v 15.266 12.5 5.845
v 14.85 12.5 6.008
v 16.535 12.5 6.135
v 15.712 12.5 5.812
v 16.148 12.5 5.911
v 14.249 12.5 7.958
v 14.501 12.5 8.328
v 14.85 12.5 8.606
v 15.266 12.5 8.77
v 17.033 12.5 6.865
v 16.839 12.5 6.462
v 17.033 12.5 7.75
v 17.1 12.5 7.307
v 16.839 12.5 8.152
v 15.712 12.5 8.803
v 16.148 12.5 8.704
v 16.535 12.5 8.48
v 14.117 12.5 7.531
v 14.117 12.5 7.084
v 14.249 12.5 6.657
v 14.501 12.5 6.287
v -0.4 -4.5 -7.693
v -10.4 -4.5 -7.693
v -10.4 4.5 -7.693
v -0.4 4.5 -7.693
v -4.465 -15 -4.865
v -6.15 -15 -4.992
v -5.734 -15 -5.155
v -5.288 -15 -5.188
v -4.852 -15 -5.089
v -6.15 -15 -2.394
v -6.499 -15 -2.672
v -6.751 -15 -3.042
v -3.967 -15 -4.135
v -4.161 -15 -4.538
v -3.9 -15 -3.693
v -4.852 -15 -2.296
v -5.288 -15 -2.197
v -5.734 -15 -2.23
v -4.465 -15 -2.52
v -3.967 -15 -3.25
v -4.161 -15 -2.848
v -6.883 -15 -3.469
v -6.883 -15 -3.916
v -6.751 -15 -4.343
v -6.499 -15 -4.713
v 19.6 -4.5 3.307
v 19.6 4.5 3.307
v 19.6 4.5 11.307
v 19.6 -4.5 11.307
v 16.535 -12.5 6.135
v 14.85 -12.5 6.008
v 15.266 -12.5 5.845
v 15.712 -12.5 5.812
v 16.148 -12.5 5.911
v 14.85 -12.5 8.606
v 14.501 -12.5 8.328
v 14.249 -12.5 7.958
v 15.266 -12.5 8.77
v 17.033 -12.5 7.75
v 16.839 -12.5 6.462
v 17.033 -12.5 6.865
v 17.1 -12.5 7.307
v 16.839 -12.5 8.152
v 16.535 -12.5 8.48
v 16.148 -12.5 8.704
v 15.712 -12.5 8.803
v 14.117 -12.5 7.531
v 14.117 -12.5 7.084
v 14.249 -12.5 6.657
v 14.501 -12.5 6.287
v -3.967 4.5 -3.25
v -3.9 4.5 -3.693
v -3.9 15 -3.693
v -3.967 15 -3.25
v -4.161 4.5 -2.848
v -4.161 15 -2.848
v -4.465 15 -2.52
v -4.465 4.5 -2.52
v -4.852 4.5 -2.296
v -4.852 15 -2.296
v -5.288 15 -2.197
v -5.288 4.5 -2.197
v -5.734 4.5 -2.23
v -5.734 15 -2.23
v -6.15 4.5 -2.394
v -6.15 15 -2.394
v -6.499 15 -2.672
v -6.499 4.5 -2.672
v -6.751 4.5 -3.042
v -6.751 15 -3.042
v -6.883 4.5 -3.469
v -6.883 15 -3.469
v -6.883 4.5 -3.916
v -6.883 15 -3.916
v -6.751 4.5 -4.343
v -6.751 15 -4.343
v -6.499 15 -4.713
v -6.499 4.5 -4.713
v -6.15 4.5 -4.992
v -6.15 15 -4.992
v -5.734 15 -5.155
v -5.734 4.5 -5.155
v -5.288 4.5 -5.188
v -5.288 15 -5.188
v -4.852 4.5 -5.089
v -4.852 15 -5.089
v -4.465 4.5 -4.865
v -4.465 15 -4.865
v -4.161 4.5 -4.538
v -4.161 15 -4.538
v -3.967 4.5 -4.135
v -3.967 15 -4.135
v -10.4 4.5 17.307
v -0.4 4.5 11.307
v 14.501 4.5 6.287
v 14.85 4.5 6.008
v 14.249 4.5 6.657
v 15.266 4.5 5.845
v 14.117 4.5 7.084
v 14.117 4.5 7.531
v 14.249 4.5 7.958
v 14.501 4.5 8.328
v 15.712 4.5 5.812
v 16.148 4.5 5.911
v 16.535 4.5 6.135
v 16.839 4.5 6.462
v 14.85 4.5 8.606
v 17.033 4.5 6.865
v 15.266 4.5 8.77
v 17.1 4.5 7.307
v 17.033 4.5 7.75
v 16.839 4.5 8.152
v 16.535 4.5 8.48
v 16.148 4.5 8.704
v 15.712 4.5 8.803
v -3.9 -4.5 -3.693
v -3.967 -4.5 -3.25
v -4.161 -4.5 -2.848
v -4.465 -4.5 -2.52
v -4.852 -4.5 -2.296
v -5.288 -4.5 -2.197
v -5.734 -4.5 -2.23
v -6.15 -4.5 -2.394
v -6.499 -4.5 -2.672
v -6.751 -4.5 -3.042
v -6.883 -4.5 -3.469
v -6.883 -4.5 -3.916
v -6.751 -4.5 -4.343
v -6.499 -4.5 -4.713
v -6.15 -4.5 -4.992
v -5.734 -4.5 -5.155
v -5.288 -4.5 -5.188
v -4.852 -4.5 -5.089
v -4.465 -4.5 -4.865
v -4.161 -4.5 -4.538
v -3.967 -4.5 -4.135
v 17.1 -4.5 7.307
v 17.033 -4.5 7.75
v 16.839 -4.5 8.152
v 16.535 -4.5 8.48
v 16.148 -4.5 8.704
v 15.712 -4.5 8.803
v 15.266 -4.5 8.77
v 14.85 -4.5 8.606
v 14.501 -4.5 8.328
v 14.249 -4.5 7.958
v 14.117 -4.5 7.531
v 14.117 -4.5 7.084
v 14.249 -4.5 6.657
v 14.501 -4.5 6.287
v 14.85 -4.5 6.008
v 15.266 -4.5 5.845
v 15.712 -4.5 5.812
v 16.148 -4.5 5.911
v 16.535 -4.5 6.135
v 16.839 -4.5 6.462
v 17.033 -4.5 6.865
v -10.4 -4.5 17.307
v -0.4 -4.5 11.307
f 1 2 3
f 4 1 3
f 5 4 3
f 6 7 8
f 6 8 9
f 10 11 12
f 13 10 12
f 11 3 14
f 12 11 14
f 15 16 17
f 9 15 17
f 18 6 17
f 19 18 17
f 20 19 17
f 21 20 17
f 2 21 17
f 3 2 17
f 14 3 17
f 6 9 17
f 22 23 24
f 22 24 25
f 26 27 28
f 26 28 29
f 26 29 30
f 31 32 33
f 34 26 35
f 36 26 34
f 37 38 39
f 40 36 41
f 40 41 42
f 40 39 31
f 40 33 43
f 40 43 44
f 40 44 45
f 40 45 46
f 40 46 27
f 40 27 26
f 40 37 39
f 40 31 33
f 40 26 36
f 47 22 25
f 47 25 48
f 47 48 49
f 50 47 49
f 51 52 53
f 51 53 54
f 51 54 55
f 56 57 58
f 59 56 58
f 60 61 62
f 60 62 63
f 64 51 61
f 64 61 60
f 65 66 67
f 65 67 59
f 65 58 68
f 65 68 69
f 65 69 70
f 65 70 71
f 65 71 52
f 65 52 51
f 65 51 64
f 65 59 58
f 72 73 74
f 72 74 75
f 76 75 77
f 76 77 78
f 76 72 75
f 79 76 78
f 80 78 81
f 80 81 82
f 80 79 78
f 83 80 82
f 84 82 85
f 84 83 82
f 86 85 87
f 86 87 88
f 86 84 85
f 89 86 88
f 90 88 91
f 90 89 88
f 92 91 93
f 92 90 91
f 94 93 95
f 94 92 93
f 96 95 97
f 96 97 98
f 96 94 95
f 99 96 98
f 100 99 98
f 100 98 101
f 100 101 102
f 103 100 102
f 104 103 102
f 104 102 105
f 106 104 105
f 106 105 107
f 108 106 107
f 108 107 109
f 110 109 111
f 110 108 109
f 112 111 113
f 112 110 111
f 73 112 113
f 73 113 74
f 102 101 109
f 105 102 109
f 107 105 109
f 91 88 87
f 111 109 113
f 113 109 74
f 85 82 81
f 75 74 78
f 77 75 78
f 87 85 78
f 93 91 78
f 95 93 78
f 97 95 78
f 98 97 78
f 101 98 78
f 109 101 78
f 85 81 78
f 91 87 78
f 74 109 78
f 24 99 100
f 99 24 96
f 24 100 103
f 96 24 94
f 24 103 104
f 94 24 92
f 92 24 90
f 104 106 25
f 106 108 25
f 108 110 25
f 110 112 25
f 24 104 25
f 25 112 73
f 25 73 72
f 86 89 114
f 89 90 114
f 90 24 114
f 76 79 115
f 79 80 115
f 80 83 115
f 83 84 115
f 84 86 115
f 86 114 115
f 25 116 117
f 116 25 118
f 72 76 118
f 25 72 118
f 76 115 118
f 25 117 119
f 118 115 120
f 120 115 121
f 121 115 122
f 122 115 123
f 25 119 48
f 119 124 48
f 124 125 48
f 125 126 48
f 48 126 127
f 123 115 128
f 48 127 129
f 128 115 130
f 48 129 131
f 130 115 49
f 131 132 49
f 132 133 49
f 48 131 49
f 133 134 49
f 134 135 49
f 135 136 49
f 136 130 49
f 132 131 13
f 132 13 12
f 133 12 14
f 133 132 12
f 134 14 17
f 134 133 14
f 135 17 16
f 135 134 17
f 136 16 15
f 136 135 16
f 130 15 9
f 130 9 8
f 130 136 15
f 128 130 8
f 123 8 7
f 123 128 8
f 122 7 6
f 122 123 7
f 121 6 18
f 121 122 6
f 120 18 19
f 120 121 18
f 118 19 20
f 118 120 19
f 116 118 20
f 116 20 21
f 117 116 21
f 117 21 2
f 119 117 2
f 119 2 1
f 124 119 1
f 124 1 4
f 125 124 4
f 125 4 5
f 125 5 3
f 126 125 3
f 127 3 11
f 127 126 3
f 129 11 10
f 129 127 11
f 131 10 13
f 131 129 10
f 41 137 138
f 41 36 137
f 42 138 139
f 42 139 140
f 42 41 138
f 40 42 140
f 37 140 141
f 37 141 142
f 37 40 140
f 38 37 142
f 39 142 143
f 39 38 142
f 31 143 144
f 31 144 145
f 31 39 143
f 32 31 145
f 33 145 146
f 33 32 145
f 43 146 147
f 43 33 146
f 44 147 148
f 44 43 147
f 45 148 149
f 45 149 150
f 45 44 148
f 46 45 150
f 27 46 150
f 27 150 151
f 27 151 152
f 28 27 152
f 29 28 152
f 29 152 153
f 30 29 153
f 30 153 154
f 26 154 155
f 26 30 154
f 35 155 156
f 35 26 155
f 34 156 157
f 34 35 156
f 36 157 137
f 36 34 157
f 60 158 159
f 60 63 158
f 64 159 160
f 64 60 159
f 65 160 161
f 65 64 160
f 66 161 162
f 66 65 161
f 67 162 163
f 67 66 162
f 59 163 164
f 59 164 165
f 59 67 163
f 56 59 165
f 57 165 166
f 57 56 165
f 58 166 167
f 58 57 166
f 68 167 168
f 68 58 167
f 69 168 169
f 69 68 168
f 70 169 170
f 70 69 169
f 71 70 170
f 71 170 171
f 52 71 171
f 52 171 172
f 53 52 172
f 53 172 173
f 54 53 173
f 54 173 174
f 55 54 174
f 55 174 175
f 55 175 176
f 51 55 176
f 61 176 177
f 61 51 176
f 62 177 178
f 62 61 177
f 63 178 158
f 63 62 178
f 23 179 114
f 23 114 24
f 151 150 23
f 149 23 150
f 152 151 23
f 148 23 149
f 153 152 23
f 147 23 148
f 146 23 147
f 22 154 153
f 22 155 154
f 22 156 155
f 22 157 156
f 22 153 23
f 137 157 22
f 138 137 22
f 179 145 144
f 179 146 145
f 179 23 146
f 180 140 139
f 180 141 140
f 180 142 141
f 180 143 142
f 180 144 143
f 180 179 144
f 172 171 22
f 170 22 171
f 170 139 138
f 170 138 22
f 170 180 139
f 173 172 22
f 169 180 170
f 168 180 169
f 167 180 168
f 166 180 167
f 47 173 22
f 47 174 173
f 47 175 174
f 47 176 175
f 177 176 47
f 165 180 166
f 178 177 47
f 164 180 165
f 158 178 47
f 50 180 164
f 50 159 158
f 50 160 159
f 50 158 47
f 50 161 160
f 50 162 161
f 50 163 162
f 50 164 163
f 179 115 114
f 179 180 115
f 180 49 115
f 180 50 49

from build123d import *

# Parameters (mm, degrees)
F0_R     = 1.5
F1_DEPTH = 4.5
F2_DEPTH = 15
F3_DEPTH = 12.5


with BuildPart() as f1:
    # F0 (on Front) → F1 (new body, symmetric)
    with BuildSketch(Plane.XZ):
        Polygon((-0.399913, 11.307418), (-10.399913, 17.307418), (-10.399913, -7.692582), (-0.399913, -7.692582), (19.600087, 3.307418), (19.600087, 11.307418), align=None)
        with Locations((-5.399913, -3.692582)):
            Circle(F0_R, mode=Mode.SUBTRACT)
        with Locations((15.600087, 7.307418)):
            Circle(F0_R, mode=Mode.SUBTRACT)
    extrude(amount=F1_DEPTH, both=True)

    # F0 (on Front) → F2 (join, symmetric)
    with BuildSketch(Plane.XZ):
        with Locations((-5.399913, -3.692582)):
            Circle(F0_R)
    extrude(amount=F2_DEPTH, both=True)

    # F0 (on Front) → F3 (join, symmetric)
    with BuildSketch(Plane.XZ):
        with Locations((15.600087, 7.307418)):
            Circle(F0_R)
    extrude(amount=F3_DEPTH, both=True)


solid = f1.part
